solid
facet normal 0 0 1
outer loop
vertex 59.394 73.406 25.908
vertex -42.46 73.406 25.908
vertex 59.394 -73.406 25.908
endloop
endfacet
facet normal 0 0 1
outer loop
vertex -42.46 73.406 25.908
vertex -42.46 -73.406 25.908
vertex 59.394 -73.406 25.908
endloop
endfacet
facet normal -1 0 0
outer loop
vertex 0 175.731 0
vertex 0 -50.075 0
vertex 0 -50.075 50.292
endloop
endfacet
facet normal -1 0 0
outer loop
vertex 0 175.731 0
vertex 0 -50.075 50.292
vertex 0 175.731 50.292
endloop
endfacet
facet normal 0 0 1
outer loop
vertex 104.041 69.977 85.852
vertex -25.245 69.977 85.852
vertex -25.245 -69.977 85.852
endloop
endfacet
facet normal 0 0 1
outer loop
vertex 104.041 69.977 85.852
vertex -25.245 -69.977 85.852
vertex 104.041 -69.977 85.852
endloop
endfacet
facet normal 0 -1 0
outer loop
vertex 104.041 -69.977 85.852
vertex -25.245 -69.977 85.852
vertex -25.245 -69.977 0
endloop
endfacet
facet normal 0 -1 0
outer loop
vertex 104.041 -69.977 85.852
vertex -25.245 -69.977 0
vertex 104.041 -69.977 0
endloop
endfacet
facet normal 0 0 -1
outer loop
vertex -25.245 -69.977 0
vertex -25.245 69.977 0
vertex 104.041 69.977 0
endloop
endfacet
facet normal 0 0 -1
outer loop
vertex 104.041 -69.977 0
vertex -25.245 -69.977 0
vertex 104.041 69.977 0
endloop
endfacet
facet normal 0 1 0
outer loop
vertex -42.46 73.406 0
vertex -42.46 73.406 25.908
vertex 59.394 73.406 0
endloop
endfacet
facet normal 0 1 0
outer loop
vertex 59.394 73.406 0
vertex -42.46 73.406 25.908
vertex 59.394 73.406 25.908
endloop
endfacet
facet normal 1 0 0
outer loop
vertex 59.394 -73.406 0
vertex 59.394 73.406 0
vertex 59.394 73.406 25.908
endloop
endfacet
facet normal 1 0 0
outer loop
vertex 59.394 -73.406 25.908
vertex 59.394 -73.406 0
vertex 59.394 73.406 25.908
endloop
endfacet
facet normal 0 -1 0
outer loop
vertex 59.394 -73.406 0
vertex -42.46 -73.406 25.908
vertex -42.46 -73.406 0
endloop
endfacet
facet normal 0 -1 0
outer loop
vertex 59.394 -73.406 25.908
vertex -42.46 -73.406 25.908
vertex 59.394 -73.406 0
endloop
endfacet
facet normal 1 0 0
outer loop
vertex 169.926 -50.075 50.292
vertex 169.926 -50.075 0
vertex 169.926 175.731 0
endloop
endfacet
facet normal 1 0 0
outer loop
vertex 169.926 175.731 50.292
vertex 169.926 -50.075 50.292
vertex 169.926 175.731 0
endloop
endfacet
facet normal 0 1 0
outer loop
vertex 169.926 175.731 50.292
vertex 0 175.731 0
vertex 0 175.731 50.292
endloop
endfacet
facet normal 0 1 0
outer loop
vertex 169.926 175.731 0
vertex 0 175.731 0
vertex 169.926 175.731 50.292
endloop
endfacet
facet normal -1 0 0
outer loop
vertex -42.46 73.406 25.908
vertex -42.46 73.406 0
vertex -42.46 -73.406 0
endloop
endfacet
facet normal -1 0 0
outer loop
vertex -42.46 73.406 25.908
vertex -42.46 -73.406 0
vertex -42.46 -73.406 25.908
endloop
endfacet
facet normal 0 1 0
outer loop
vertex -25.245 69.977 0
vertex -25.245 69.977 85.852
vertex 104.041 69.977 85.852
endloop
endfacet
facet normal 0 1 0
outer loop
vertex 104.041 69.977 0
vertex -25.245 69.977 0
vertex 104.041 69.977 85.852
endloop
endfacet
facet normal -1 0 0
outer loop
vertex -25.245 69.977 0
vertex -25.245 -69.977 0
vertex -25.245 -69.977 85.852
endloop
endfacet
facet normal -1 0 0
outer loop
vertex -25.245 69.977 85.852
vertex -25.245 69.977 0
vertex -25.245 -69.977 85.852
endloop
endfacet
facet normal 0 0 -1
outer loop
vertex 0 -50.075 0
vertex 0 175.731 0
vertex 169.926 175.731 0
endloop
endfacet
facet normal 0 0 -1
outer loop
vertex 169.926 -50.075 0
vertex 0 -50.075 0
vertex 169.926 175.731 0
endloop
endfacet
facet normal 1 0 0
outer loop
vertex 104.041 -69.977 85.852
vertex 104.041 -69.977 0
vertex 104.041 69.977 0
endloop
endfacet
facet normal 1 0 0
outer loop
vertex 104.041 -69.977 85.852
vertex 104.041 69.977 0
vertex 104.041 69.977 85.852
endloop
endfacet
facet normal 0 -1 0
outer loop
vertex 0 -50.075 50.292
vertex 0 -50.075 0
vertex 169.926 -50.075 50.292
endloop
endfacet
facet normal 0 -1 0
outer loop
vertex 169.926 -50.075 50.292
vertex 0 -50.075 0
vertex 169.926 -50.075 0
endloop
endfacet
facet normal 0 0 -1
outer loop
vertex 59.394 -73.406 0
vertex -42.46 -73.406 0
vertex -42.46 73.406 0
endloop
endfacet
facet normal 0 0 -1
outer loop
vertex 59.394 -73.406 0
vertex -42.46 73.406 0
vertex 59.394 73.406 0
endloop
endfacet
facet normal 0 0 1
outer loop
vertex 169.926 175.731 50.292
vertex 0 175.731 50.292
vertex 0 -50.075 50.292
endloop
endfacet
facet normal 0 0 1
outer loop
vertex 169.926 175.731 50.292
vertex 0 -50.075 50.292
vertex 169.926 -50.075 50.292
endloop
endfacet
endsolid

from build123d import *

# Parameters (mm, degrees)
F0_W     = 101.854
F0_H     = 25.908
F1_DEPTH = 73.406
F2_W     = 129.286
F2_H     = 85.852
F3_DEPTH = 69.977
F4_W     = 169.926
F4_H     = 225.806
F5_DEPTH = 50.292


with BuildPart() as f1:
    # F0 (on Front) → F1 (new body, symmetric)
    with BuildSketch(Plane.XZ):
        with Locations((8.466536, 12.954)):
            Rectangle(F0_W, F0_H)
    extrude(amount=F1_DEPTH, both=True)


with BuildPart() as f3:
    # F2 (on Front) → F3 (new body, symmetric)
    with BuildSketch(Plane.XZ):
        with Locations((39.398466, 42.926)):
            Rectangle(F2_W, F2_H)
    extrude(amount=F3_DEPTH, both=True)


with BuildPart() as f5:
    # F4 (on Top) → F5 (new body)
    with BuildSketch(Plane.XY):
        with Locations((84.963, 62.827774)):
            Rectangle(F4_W, F4_H)
    extrude(amount=F5_DEPTH)


solid = Compound([f1.part, f3.part, f5.part])
